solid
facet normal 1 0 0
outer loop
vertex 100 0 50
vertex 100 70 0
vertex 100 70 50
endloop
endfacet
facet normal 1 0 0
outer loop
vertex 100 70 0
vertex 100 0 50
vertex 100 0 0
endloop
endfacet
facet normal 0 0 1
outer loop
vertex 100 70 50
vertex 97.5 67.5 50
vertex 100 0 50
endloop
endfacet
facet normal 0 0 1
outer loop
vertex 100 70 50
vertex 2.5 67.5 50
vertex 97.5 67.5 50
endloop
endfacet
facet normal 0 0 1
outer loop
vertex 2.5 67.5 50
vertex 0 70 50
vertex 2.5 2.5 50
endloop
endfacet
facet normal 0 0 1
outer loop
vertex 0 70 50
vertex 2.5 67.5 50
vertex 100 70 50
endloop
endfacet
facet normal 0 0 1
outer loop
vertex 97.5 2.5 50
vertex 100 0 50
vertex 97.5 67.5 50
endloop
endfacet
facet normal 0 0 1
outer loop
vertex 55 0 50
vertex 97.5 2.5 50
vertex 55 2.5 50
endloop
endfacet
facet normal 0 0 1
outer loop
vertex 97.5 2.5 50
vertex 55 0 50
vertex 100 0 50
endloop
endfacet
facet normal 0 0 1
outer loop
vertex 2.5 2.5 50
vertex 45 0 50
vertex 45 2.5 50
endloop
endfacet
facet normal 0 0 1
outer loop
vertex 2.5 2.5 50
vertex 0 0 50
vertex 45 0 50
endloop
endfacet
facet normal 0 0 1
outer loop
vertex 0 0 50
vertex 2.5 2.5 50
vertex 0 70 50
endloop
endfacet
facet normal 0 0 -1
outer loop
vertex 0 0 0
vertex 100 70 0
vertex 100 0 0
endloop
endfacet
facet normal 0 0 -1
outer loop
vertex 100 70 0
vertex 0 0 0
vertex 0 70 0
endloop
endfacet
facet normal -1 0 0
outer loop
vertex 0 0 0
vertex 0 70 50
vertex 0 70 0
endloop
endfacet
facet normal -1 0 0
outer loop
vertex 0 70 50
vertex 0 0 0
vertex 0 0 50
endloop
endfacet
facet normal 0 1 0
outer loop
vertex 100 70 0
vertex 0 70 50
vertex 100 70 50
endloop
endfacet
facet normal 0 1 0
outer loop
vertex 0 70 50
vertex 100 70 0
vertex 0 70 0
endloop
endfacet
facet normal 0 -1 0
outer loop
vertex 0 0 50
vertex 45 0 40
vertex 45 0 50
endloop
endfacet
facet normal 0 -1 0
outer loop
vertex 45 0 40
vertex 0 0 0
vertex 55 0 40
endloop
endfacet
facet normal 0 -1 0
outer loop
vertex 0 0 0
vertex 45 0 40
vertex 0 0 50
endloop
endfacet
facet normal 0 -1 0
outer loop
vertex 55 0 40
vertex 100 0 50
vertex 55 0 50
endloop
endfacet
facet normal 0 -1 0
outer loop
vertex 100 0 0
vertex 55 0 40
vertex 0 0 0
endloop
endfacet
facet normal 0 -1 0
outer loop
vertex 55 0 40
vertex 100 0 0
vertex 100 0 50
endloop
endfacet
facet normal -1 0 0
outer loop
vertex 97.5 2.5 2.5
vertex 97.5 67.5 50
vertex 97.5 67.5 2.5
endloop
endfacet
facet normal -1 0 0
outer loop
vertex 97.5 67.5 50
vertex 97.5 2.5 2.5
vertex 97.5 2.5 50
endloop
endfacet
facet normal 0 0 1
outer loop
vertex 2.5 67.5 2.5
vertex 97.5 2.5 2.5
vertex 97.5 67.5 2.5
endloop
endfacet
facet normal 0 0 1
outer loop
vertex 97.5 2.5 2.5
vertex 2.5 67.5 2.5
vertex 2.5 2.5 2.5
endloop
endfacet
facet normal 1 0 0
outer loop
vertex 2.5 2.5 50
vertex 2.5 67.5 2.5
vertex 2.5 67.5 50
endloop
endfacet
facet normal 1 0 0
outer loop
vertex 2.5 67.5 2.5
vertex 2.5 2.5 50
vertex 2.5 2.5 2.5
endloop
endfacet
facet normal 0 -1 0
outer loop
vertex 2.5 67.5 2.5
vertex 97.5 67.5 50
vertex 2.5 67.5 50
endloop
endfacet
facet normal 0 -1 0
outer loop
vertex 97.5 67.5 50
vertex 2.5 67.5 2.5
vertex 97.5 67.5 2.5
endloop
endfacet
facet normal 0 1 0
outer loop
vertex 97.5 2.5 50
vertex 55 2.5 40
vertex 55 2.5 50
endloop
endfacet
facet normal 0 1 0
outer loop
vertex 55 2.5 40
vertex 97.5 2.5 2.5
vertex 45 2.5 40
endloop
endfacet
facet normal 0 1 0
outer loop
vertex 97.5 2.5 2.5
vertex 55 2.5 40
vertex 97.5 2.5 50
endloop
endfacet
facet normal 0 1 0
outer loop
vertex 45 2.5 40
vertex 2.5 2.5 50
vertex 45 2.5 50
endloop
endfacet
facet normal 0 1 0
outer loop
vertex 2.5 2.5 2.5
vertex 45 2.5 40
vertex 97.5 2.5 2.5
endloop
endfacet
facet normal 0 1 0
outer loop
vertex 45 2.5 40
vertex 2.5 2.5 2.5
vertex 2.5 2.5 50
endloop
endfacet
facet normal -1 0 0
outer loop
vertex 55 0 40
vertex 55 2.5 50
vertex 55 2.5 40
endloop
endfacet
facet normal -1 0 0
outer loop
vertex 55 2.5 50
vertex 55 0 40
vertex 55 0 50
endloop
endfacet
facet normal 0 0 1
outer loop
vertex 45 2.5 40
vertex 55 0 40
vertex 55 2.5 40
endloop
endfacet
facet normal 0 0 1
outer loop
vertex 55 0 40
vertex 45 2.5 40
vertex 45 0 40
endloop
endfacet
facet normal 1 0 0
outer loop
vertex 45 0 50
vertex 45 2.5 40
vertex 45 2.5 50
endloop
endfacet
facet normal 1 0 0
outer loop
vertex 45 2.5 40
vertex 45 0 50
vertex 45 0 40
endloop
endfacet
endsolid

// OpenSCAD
$fn = 32;

// ----------------------------------------------------------------------
// Enclosure box: notch enclosure
// ----------------------------------------------------------------------

// --- parameters (mm) ---
box_l = 100;              // outer length, X
box_w = 70;               // outer width, Y
box_h = 50;               // outer height
wall_t = 2.5;             // wall thickness
notch_w = 10;             // cable notch width
notch_h = 10;             // cable notch height

inner_h = box_h - wall_t;  // cavity depth
boss_h = inner_h - 2;  // corner boss height

difference() {
  union() {
    difference() {
      cube([box_l, box_w, box_h]);
      translate([wall_t, wall_t, wall_t])
        cube([box_l - 2 * wall_t, box_w - 2 * wall_t, box_h]);
    }
  }
  translate([box_l / 2 - notch_w / 2, -1, box_h - notch_h])
    cube([notch_w, wall_t + 2, notch_h + 1]);
}
